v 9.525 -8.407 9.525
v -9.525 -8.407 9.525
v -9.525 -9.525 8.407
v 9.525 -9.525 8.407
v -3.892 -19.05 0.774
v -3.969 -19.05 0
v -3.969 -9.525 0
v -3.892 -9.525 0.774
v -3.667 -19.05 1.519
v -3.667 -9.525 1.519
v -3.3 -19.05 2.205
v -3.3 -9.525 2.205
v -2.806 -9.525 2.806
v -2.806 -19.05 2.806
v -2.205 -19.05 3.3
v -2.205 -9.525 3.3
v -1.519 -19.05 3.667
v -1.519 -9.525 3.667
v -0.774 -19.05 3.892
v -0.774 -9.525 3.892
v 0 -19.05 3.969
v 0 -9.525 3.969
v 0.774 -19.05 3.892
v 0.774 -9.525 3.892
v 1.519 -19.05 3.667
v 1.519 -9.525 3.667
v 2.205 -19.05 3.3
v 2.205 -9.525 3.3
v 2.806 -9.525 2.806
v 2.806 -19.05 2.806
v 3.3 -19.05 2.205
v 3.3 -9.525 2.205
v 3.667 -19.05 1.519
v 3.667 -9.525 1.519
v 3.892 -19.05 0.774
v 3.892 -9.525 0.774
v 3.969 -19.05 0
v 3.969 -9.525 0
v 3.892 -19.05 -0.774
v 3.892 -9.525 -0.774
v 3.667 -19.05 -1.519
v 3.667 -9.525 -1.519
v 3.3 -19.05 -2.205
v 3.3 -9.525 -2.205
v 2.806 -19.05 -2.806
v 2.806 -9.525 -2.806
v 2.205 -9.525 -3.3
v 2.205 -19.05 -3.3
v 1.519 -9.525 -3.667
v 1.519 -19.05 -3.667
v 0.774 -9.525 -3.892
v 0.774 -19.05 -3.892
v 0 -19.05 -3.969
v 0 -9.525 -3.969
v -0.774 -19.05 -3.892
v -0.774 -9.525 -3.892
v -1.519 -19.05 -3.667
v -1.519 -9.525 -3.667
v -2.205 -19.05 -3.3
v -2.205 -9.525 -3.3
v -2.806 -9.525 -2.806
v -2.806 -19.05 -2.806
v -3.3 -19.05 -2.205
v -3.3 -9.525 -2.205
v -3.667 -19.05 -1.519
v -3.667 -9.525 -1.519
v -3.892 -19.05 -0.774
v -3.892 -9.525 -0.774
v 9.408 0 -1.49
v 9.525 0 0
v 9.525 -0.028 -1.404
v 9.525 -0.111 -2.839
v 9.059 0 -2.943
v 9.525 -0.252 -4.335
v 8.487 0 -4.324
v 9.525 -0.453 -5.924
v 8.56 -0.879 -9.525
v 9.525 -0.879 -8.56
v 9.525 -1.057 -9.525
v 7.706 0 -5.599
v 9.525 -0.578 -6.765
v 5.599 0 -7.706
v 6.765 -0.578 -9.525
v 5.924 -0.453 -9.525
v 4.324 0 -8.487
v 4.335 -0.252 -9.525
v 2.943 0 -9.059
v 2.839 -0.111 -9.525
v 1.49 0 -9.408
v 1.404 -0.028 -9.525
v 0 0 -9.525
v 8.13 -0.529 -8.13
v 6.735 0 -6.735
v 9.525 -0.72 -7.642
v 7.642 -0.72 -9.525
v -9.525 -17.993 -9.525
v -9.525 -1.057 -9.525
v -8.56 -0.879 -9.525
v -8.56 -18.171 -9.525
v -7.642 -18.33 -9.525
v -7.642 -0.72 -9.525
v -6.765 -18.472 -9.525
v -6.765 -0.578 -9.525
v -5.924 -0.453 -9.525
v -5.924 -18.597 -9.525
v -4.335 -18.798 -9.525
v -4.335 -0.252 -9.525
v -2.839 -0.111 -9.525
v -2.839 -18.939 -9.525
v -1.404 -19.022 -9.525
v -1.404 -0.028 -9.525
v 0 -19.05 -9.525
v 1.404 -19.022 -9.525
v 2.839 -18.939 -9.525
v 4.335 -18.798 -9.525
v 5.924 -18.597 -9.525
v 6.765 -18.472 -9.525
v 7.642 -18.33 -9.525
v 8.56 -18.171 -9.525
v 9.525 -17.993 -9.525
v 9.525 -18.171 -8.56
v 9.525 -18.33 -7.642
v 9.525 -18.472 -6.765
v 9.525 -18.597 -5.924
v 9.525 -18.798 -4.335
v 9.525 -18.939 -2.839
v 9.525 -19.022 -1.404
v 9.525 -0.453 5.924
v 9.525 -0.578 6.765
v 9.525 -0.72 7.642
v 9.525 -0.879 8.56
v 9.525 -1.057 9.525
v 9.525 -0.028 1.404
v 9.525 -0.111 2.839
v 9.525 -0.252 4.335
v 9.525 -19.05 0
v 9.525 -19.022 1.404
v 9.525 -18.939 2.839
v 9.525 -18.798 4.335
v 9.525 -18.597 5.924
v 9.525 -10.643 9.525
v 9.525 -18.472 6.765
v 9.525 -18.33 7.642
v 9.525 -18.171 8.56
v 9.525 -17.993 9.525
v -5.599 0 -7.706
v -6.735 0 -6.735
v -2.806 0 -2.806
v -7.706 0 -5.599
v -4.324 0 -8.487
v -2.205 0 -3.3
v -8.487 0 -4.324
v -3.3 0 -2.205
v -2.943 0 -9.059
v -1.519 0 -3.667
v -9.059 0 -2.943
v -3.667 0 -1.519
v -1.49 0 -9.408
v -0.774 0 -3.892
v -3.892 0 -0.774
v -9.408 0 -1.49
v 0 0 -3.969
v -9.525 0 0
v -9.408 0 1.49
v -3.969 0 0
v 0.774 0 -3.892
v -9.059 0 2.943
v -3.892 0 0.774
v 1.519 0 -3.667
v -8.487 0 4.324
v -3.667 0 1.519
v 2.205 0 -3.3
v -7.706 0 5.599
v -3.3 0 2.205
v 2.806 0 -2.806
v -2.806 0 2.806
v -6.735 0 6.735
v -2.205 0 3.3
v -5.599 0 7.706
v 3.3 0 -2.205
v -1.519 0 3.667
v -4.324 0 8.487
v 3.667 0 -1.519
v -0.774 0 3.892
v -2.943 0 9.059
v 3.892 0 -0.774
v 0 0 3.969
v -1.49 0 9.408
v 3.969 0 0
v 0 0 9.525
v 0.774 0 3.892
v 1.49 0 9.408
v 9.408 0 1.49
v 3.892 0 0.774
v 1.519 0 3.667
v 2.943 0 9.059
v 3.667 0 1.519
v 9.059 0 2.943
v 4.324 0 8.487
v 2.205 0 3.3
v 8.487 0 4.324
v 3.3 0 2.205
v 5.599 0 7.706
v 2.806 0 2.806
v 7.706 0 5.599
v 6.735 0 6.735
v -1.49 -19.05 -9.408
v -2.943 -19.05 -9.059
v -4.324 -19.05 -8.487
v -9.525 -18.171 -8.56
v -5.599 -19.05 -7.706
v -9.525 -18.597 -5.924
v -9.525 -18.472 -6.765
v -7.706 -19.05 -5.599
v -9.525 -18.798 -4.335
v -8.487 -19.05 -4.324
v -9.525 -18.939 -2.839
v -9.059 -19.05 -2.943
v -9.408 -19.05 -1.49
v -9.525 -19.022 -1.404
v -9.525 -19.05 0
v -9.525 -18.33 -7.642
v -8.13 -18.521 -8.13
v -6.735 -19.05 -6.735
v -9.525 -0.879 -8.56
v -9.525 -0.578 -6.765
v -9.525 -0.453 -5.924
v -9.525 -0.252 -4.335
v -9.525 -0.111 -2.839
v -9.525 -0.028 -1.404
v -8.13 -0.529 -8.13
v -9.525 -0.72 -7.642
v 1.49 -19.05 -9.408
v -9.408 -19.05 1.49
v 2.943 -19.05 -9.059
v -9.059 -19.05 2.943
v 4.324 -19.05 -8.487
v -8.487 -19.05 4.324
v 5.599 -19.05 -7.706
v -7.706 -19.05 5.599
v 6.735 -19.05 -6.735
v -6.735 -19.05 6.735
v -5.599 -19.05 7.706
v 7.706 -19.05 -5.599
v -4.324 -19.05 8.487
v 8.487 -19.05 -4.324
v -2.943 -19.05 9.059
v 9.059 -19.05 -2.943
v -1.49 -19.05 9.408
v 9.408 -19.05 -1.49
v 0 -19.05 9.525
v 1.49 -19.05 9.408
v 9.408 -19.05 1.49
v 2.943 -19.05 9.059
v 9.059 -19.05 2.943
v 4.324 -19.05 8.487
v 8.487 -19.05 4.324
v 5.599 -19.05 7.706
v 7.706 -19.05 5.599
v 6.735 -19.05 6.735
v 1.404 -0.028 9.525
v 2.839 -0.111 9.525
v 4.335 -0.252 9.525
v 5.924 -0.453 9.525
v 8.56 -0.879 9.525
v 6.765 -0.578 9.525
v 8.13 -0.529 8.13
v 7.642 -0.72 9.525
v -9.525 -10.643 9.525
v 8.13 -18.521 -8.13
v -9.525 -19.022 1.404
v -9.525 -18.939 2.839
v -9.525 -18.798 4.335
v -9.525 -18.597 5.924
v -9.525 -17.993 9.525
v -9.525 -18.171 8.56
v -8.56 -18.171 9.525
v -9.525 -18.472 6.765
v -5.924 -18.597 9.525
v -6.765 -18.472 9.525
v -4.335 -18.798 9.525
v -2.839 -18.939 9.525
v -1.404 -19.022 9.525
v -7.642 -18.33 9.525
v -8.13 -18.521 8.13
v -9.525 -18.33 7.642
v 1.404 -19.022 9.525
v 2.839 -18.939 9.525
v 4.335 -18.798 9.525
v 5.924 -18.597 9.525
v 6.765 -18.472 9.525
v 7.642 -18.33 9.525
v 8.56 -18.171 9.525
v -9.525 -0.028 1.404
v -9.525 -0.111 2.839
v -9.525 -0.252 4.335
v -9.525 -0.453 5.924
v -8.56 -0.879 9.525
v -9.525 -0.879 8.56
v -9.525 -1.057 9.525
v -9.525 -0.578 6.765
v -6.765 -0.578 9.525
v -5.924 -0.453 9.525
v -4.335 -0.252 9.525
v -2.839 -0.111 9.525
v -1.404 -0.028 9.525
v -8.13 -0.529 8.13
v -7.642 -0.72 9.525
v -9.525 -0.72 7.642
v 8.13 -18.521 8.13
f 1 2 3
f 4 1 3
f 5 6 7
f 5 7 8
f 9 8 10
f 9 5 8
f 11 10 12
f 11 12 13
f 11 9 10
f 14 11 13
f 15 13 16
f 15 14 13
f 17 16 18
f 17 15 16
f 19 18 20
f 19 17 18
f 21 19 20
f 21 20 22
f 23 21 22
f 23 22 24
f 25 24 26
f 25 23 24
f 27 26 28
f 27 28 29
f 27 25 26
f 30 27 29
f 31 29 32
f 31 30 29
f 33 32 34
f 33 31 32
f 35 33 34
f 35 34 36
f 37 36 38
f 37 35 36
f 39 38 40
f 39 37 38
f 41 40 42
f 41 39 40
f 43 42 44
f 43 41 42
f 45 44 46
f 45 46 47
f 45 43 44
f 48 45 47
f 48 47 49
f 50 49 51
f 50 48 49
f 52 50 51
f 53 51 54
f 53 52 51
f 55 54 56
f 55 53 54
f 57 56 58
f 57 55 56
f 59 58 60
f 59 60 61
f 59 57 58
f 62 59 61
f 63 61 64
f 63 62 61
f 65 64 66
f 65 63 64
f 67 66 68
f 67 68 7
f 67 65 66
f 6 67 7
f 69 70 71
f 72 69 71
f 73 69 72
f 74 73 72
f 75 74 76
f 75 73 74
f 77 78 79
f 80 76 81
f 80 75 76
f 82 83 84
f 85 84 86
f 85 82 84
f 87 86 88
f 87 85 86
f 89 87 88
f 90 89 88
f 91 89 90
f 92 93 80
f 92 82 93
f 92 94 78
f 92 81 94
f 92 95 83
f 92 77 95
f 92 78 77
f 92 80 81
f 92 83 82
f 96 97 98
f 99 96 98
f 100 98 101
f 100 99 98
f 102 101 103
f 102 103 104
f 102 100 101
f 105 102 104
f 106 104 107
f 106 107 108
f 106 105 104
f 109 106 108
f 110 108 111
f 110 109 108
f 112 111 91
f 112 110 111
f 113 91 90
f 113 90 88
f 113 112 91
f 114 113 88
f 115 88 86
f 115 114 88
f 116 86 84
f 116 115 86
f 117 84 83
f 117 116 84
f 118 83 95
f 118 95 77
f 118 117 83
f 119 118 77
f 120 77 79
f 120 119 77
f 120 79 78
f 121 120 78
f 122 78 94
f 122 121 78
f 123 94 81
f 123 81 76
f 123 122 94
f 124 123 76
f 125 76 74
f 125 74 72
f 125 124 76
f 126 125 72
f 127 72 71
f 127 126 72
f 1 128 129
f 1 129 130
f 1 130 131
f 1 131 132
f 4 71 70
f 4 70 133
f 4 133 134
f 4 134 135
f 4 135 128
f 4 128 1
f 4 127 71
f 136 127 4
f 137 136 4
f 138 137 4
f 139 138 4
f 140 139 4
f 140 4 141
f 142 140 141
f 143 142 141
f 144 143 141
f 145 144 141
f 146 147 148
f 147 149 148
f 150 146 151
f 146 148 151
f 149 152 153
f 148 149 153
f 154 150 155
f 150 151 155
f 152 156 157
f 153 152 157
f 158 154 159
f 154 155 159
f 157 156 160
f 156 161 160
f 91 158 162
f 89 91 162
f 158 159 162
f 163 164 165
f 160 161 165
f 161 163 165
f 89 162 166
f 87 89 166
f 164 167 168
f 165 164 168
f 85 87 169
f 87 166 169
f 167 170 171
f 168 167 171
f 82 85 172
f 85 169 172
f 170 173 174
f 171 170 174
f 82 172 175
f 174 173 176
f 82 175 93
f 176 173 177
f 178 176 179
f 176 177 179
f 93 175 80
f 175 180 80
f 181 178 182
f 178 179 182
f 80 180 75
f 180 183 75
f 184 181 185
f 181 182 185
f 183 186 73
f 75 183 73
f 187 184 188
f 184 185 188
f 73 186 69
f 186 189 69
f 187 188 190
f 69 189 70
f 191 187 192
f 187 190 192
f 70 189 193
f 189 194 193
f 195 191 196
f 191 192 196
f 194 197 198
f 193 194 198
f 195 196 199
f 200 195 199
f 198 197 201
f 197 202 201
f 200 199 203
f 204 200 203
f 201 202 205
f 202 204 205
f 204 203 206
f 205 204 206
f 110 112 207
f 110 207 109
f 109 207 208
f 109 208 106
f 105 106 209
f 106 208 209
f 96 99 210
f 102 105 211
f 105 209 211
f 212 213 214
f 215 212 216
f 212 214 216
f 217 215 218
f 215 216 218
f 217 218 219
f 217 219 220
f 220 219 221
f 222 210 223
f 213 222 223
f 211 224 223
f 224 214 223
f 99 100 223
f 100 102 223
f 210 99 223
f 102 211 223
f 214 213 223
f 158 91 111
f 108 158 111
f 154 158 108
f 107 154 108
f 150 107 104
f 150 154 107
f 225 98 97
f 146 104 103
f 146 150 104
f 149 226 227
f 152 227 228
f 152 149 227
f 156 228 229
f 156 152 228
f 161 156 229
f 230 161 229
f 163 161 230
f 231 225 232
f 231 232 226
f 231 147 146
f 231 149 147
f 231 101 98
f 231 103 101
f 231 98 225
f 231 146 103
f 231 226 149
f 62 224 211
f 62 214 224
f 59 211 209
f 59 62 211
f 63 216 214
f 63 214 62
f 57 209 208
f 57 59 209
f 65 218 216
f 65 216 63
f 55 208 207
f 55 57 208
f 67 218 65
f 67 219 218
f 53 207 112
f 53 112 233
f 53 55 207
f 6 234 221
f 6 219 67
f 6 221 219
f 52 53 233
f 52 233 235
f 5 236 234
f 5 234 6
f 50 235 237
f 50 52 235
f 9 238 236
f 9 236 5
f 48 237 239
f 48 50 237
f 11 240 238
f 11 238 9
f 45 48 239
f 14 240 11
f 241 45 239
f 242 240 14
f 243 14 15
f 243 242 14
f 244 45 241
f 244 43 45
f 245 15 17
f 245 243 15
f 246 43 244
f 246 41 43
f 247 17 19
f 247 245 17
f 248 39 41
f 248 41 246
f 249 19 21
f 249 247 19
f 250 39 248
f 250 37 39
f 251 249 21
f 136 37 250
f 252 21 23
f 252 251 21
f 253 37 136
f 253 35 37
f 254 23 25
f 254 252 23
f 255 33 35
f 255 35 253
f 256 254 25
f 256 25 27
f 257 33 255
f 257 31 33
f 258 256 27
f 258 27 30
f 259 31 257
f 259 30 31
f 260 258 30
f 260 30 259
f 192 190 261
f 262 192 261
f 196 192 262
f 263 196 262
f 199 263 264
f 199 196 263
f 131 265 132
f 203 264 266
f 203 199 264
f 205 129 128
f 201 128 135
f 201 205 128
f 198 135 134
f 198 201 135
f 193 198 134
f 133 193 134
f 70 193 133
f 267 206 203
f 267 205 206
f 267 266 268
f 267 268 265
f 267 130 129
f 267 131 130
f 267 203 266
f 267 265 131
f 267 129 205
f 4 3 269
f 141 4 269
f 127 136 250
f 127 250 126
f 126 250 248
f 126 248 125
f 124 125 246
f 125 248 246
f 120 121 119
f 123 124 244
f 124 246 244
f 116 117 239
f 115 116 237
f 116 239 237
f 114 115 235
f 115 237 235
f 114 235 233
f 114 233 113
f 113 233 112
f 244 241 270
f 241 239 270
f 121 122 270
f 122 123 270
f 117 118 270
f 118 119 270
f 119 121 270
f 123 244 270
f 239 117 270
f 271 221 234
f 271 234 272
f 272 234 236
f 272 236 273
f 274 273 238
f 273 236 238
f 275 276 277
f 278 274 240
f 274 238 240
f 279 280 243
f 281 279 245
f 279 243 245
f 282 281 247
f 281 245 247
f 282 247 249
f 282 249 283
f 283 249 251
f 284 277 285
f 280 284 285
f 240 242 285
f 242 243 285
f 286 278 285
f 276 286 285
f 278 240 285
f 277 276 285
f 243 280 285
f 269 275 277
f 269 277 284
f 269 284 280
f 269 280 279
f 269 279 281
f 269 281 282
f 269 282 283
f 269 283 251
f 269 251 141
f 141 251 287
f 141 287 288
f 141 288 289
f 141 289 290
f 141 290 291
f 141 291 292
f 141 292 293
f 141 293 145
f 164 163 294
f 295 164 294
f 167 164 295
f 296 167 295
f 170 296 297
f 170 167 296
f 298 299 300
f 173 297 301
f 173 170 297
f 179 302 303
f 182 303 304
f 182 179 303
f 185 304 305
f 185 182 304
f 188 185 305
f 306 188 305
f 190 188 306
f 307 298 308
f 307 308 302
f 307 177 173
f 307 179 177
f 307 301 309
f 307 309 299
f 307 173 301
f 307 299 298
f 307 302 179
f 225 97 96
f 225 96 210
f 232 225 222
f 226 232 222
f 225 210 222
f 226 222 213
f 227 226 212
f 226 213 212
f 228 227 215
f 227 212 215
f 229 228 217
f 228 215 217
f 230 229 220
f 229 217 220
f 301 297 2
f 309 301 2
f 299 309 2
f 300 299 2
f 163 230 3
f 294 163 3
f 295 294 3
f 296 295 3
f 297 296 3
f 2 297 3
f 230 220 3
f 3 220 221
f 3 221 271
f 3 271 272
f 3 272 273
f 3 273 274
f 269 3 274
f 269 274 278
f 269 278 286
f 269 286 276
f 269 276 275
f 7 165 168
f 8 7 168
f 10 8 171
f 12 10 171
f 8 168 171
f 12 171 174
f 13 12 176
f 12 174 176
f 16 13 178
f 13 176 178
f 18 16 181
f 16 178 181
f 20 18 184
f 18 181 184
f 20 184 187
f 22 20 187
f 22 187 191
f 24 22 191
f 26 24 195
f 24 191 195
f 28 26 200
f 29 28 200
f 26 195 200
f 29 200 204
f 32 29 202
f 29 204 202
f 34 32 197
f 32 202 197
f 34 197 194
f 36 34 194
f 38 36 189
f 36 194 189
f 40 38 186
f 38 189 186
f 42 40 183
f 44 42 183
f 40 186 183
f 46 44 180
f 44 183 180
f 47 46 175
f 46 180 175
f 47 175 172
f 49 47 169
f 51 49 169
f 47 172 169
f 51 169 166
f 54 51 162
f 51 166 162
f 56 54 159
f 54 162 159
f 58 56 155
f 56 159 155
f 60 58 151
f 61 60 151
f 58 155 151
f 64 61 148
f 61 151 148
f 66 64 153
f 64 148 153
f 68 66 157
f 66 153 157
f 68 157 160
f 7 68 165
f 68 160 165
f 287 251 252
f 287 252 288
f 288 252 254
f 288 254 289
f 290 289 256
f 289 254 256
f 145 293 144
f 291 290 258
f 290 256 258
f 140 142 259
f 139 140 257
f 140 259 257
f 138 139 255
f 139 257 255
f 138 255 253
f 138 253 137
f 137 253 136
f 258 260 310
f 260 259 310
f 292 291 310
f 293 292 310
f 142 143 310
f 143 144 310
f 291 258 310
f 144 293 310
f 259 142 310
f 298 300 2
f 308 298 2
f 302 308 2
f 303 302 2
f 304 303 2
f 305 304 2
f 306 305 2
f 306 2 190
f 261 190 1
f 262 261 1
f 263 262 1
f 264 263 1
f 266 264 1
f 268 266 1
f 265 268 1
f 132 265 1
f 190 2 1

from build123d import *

# Parameters (mm, degrees)
F0_W     = 19.05
F0_H     = 19.05
F1_DEPTH = 9.525
F5_R     = 3.96875
F6_DEPTH = 9.525
F9_DEPTH = 19.05


with BuildPart() as f1:
    # F0 (on Front) → F1 (new body)
    with BuildSketch(Plane.XZ):
        Rectangle(F0_W, F0_H)
    extrude(amount=F1_DEPTH)

    # F3 (on Right) → F4 (revolve, cut)
    with BuildSketch(Plane.YZ):
        Polygon((-2.8980535523, 20.3406831001), (0, 9.525), (0, 20.3406831001), align=None)
    revolve(axis=Axis((0, 0, 0), (0, 1, 0)), mode=Mode.SUBTRACT)

    # F5 (on face) → F6 (cut)
    with BuildSketch(Plane(origin=(0, 0, 0), x_dir=(-1, 0, 0), z_dir=(0, 1, 0))):
        Circle(F5_R)
    extrude(amount=-F6_DEPTH, mode=Mode.SUBTRACT)

    # F7: F1 across face


with BuildPart() as f1_1:
    add(f1.part)
    add(f1.part.mirror(Plane.XZ.offset(9.525)))

    # F8 (on face) → F9 (cut)
    with BuildSketch(Plane(origin=(-9.525, 0, 0), x_dir=(0, -1, 0), z_dir=(-1, 0, 0))):
        Polygon((8.4074, 9.525), (9.525, 8.4074), (10.6426, 9.525), align=None)
    extrude(amount=-F9_DEPTH, mode=Mode.SUBTRACT)


solid = f1_1.part
